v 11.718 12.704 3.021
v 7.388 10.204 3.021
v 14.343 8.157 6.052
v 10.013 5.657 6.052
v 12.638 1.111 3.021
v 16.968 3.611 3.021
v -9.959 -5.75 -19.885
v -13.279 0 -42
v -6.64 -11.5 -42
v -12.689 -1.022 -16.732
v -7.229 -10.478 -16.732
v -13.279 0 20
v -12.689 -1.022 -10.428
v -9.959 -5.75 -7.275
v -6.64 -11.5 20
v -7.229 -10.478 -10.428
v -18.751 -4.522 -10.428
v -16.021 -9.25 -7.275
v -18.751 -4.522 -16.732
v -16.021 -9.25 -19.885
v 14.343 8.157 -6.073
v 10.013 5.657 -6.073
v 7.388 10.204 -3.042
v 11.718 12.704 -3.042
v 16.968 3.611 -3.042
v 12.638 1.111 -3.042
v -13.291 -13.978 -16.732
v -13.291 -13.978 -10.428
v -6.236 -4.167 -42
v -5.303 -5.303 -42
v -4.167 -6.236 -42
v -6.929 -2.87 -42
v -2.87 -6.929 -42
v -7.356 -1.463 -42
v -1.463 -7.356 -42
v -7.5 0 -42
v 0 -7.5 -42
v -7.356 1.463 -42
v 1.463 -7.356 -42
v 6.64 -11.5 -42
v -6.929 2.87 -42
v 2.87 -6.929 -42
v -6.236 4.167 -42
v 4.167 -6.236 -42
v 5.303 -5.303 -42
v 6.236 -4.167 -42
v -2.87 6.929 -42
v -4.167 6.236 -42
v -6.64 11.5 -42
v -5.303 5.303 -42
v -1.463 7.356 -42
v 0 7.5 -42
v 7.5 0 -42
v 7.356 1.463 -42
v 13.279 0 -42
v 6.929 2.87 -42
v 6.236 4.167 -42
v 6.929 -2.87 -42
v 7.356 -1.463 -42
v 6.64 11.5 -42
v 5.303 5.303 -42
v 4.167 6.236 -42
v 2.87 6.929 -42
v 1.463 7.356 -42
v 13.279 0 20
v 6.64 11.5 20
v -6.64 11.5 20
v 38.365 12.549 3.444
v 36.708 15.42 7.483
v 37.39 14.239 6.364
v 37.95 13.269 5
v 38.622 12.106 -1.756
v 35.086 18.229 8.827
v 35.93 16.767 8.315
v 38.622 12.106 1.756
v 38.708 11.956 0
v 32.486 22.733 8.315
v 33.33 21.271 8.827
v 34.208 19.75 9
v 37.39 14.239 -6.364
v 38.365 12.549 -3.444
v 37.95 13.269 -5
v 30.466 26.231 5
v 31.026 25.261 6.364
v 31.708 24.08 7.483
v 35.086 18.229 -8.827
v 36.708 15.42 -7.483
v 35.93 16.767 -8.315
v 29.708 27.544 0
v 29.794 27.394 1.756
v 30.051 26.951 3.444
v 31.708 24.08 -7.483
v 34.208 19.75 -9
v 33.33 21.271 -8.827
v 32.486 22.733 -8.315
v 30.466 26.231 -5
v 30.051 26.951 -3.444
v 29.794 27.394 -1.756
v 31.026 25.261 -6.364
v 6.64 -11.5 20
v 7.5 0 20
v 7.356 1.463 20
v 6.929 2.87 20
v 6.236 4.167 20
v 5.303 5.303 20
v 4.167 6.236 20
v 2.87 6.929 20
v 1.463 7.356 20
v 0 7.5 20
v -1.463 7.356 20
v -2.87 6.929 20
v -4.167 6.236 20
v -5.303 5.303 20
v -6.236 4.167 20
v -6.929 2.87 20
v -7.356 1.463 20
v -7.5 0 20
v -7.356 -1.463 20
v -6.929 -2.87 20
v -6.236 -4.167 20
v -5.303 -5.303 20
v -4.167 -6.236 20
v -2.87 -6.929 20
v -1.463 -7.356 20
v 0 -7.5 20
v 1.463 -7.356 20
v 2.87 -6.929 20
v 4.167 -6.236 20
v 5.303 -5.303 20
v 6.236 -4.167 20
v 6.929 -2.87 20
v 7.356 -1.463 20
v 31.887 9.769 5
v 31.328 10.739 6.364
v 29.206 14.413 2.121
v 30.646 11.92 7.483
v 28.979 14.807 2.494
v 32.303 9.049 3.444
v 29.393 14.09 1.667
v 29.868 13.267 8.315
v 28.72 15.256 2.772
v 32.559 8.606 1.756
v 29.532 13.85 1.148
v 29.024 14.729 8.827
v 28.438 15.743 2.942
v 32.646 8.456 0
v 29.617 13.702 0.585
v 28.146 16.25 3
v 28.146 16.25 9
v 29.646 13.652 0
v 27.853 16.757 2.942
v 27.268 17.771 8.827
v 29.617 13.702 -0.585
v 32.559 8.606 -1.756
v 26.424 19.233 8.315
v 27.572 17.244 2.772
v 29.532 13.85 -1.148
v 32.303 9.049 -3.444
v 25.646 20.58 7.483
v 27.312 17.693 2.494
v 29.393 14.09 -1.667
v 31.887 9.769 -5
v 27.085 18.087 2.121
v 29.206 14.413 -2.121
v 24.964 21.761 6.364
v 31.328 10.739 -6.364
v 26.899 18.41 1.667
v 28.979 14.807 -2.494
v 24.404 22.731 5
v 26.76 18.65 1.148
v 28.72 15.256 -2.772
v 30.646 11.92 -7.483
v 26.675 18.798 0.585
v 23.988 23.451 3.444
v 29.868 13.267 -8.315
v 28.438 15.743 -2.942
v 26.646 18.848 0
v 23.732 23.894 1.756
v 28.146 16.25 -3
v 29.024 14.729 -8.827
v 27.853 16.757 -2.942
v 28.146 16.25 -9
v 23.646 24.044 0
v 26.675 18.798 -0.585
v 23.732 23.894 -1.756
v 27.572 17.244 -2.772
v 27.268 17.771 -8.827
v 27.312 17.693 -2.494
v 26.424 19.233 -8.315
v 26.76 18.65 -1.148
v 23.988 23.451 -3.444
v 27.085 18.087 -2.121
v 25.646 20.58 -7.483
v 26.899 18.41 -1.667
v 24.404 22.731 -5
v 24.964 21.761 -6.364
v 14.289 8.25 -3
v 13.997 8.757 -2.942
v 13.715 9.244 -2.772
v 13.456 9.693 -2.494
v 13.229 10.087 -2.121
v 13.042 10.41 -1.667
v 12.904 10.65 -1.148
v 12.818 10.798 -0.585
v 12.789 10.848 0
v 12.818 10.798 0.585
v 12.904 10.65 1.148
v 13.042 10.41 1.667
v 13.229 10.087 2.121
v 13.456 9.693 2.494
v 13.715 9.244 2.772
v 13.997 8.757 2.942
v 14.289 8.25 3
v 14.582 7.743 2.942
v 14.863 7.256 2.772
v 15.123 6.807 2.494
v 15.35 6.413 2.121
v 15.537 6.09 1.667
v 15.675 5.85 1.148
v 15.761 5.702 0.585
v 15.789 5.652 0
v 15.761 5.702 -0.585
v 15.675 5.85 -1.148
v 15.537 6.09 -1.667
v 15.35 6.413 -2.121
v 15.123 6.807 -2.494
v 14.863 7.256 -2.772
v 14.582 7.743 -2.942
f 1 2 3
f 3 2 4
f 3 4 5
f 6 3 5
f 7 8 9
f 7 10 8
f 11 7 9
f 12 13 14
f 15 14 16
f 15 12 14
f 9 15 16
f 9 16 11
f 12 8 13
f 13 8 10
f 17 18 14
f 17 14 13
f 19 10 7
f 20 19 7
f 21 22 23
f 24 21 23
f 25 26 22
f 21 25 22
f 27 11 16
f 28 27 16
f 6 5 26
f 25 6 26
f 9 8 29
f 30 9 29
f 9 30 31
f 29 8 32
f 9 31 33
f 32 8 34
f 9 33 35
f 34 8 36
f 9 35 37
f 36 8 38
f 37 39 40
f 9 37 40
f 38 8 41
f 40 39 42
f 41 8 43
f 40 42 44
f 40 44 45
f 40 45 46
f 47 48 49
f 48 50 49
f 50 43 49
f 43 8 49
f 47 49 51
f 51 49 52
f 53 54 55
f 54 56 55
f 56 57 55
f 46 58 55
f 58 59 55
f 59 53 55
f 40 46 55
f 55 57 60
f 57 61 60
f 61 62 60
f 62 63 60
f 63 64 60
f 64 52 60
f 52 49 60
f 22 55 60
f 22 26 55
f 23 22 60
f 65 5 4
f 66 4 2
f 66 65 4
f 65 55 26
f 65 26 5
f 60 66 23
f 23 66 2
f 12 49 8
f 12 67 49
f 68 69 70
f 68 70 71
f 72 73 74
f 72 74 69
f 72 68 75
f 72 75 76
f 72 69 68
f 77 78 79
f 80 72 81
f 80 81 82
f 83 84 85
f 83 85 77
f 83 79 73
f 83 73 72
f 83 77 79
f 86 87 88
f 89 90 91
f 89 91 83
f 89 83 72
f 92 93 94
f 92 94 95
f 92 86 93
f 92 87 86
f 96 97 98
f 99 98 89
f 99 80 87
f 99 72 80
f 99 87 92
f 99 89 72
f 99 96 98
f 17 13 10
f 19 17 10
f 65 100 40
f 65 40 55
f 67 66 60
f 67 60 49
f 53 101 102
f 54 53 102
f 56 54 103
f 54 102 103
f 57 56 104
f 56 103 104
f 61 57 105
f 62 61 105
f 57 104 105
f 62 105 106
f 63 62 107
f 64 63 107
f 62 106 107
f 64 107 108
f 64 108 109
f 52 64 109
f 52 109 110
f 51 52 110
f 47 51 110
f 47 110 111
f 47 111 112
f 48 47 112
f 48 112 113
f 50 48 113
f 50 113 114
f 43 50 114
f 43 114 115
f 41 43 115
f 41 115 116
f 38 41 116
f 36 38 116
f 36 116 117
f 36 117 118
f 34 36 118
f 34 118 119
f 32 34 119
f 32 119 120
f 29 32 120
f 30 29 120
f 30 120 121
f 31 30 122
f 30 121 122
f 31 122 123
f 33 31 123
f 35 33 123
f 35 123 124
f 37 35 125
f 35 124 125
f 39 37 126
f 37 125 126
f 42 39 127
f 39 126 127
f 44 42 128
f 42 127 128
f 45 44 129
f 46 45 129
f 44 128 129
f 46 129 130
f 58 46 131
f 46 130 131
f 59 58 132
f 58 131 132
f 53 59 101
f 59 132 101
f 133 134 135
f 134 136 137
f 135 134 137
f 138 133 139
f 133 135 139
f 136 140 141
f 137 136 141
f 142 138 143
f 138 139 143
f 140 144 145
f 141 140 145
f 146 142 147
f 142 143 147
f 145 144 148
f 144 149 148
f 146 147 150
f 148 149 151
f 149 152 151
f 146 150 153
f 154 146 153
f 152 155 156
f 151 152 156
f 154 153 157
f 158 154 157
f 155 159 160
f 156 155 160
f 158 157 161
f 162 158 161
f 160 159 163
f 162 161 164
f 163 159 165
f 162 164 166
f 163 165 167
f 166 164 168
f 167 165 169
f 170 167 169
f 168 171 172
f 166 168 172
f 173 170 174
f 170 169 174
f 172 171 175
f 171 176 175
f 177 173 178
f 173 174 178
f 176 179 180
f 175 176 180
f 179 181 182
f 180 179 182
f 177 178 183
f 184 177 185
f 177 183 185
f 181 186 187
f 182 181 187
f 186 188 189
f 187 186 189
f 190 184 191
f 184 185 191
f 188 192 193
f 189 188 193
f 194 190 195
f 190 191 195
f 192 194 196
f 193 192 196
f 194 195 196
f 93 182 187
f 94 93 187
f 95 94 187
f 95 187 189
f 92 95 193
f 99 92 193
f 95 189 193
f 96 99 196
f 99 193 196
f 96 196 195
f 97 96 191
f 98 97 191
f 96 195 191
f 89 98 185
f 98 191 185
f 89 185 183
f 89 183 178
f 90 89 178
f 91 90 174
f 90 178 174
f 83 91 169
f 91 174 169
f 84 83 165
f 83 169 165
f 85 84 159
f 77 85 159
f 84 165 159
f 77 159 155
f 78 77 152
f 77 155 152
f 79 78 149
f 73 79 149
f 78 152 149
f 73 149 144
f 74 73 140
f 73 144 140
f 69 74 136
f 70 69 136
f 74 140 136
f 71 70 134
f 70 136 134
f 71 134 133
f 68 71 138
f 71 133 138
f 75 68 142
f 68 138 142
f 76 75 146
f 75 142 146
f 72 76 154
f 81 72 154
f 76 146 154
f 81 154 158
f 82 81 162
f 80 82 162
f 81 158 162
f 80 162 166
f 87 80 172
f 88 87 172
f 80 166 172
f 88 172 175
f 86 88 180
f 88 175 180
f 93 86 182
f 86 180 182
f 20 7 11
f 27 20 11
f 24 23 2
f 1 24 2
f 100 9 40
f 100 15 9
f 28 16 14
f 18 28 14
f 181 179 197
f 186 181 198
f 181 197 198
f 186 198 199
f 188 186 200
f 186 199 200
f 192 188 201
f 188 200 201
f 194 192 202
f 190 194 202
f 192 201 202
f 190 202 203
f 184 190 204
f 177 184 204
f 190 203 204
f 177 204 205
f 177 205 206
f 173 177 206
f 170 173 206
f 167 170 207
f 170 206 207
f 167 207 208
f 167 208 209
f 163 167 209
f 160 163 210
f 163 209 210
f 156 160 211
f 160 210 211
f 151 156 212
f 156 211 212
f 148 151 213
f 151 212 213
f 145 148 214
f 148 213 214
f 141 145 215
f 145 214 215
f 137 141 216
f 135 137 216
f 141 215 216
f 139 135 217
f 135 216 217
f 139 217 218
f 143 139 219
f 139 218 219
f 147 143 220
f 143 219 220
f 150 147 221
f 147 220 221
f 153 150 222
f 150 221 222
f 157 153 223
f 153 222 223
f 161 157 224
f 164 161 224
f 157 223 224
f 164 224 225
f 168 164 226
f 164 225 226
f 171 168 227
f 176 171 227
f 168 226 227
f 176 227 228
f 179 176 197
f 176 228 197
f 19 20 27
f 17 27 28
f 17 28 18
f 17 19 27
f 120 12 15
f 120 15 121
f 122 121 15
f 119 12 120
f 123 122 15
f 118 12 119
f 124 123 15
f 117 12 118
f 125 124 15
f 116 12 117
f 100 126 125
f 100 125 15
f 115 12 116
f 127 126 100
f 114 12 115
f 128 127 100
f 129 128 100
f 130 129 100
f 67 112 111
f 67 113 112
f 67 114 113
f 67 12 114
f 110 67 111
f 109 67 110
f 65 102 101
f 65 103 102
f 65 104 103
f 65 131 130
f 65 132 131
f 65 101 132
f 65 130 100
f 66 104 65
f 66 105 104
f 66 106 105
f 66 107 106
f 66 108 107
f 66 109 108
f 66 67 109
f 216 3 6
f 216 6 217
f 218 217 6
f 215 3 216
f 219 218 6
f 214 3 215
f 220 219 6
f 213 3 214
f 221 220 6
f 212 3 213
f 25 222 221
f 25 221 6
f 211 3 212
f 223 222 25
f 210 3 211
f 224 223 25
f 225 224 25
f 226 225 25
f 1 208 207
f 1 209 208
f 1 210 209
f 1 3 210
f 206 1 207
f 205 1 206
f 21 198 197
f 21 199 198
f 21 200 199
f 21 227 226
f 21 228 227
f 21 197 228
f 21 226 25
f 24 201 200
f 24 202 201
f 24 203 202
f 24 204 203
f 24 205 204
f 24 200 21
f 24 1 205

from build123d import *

# Parameters (mm, degrees)
EXTRUDE_1_DEPTH      = 20
EXTRUDE_1_DEPTH_BACK = 42
SKETCH_2_R           = 7.5
CUT_EXTRUDE_1_DEPTH  = 65
EXTRUDE_2_DEPTH      = 5
SKETCH_4_R           = 3
EXTRUDE_3_DEPTH      = 16
SKETCH_5_R           = 9
EXTRUDE_4_DEPTH      = 7
EXTRUDE_5_DEPTH      = 7


with BuildPart() as part:
    # 草图1 → 凸台-拉伸1 (new body, two sides)
    with BuildSketch(Plane.XY) as extrude_1_sk:
        Polygon((-6.639528096, -11.5), (6.639528096, -11.5), (13.279056191, 0), (6.639528096, 11.5), (-6.639528096, 11.5), (-13.279056191, 0), align=None)
    extrude(amount=EXTRUDE_1_DEPTH)
    extrude(extrude_1_sk.sketch, amount=-EXTRUDE_1_DEPTH_BACK)

    # 草图2 → 切除-拉伸1 (cut)
    with BuildSketch(Plane.XY.offset(20)):
        Circle(SKETCH_2_R)
    extrude(amount=-CUT_EXTRUDE_1_DEPTH, mode=Mode.SUBTRACT)

    # 草图3 → 凸台-拉伸2 (add)
    with BuildSketch(Plane(origin=(9.959292144, 5.75, 0), x_dir=(0, 0, -1), z_dir=(0.866025404, 0.5, 0))):
        Polygon((-3.020588915, -5.357215685), (3.041588911, -5.357215685), (6.072677825, -0.107215685), (3.041588911, 5.142784315), (-3.020588915, 5.142784315), (-6.051677828, -0.107215685), align=None)
    extrude(amount=EXTRUDE_2_DEPTH)

    # 草图4 → 凸台-拉伸3 (add)
    with BuildSketch(Plane(origin=(14.289419162, 8.25, 0), x_dir=(0, 0, -1), z_dir=(0.866025404, 0.5, 0))):
        Circle(SKETCH_4_R)
    extrude(amount=EXTRUDE_3_DEPTH)

    # 草图5 → 凸台-拉伸4 (add)
    with BuildSketch(Plane(origin=(28.145825623, 16.25, 0), x_dir=(0, 0, -1), z_dir=(0.866025404, 0.5, 0))):
        Circle(SKETCH_5_R)
    extrude(amount=EXTRUDE_4_DEPTH)

    # 草图6 → 凸台-拉伸5 (add)
    with BuildSketch(Plane(origin=(-9.959292144, -5.75, 0), x_dir=(0, 0, 1), z_dir=(-0.866025404, -0.5, 0))):
        Polygon((-16.732210102, -5.46), (-10.427545163, -5.46), (-7.275212693, 0), (-10.427545163, 5.46), (-16.732210102, 5.46), (-19.884542572, 0), align=None)
    extrude(amount=EXTRUDE_5_DEPTH)


solid = part.part
